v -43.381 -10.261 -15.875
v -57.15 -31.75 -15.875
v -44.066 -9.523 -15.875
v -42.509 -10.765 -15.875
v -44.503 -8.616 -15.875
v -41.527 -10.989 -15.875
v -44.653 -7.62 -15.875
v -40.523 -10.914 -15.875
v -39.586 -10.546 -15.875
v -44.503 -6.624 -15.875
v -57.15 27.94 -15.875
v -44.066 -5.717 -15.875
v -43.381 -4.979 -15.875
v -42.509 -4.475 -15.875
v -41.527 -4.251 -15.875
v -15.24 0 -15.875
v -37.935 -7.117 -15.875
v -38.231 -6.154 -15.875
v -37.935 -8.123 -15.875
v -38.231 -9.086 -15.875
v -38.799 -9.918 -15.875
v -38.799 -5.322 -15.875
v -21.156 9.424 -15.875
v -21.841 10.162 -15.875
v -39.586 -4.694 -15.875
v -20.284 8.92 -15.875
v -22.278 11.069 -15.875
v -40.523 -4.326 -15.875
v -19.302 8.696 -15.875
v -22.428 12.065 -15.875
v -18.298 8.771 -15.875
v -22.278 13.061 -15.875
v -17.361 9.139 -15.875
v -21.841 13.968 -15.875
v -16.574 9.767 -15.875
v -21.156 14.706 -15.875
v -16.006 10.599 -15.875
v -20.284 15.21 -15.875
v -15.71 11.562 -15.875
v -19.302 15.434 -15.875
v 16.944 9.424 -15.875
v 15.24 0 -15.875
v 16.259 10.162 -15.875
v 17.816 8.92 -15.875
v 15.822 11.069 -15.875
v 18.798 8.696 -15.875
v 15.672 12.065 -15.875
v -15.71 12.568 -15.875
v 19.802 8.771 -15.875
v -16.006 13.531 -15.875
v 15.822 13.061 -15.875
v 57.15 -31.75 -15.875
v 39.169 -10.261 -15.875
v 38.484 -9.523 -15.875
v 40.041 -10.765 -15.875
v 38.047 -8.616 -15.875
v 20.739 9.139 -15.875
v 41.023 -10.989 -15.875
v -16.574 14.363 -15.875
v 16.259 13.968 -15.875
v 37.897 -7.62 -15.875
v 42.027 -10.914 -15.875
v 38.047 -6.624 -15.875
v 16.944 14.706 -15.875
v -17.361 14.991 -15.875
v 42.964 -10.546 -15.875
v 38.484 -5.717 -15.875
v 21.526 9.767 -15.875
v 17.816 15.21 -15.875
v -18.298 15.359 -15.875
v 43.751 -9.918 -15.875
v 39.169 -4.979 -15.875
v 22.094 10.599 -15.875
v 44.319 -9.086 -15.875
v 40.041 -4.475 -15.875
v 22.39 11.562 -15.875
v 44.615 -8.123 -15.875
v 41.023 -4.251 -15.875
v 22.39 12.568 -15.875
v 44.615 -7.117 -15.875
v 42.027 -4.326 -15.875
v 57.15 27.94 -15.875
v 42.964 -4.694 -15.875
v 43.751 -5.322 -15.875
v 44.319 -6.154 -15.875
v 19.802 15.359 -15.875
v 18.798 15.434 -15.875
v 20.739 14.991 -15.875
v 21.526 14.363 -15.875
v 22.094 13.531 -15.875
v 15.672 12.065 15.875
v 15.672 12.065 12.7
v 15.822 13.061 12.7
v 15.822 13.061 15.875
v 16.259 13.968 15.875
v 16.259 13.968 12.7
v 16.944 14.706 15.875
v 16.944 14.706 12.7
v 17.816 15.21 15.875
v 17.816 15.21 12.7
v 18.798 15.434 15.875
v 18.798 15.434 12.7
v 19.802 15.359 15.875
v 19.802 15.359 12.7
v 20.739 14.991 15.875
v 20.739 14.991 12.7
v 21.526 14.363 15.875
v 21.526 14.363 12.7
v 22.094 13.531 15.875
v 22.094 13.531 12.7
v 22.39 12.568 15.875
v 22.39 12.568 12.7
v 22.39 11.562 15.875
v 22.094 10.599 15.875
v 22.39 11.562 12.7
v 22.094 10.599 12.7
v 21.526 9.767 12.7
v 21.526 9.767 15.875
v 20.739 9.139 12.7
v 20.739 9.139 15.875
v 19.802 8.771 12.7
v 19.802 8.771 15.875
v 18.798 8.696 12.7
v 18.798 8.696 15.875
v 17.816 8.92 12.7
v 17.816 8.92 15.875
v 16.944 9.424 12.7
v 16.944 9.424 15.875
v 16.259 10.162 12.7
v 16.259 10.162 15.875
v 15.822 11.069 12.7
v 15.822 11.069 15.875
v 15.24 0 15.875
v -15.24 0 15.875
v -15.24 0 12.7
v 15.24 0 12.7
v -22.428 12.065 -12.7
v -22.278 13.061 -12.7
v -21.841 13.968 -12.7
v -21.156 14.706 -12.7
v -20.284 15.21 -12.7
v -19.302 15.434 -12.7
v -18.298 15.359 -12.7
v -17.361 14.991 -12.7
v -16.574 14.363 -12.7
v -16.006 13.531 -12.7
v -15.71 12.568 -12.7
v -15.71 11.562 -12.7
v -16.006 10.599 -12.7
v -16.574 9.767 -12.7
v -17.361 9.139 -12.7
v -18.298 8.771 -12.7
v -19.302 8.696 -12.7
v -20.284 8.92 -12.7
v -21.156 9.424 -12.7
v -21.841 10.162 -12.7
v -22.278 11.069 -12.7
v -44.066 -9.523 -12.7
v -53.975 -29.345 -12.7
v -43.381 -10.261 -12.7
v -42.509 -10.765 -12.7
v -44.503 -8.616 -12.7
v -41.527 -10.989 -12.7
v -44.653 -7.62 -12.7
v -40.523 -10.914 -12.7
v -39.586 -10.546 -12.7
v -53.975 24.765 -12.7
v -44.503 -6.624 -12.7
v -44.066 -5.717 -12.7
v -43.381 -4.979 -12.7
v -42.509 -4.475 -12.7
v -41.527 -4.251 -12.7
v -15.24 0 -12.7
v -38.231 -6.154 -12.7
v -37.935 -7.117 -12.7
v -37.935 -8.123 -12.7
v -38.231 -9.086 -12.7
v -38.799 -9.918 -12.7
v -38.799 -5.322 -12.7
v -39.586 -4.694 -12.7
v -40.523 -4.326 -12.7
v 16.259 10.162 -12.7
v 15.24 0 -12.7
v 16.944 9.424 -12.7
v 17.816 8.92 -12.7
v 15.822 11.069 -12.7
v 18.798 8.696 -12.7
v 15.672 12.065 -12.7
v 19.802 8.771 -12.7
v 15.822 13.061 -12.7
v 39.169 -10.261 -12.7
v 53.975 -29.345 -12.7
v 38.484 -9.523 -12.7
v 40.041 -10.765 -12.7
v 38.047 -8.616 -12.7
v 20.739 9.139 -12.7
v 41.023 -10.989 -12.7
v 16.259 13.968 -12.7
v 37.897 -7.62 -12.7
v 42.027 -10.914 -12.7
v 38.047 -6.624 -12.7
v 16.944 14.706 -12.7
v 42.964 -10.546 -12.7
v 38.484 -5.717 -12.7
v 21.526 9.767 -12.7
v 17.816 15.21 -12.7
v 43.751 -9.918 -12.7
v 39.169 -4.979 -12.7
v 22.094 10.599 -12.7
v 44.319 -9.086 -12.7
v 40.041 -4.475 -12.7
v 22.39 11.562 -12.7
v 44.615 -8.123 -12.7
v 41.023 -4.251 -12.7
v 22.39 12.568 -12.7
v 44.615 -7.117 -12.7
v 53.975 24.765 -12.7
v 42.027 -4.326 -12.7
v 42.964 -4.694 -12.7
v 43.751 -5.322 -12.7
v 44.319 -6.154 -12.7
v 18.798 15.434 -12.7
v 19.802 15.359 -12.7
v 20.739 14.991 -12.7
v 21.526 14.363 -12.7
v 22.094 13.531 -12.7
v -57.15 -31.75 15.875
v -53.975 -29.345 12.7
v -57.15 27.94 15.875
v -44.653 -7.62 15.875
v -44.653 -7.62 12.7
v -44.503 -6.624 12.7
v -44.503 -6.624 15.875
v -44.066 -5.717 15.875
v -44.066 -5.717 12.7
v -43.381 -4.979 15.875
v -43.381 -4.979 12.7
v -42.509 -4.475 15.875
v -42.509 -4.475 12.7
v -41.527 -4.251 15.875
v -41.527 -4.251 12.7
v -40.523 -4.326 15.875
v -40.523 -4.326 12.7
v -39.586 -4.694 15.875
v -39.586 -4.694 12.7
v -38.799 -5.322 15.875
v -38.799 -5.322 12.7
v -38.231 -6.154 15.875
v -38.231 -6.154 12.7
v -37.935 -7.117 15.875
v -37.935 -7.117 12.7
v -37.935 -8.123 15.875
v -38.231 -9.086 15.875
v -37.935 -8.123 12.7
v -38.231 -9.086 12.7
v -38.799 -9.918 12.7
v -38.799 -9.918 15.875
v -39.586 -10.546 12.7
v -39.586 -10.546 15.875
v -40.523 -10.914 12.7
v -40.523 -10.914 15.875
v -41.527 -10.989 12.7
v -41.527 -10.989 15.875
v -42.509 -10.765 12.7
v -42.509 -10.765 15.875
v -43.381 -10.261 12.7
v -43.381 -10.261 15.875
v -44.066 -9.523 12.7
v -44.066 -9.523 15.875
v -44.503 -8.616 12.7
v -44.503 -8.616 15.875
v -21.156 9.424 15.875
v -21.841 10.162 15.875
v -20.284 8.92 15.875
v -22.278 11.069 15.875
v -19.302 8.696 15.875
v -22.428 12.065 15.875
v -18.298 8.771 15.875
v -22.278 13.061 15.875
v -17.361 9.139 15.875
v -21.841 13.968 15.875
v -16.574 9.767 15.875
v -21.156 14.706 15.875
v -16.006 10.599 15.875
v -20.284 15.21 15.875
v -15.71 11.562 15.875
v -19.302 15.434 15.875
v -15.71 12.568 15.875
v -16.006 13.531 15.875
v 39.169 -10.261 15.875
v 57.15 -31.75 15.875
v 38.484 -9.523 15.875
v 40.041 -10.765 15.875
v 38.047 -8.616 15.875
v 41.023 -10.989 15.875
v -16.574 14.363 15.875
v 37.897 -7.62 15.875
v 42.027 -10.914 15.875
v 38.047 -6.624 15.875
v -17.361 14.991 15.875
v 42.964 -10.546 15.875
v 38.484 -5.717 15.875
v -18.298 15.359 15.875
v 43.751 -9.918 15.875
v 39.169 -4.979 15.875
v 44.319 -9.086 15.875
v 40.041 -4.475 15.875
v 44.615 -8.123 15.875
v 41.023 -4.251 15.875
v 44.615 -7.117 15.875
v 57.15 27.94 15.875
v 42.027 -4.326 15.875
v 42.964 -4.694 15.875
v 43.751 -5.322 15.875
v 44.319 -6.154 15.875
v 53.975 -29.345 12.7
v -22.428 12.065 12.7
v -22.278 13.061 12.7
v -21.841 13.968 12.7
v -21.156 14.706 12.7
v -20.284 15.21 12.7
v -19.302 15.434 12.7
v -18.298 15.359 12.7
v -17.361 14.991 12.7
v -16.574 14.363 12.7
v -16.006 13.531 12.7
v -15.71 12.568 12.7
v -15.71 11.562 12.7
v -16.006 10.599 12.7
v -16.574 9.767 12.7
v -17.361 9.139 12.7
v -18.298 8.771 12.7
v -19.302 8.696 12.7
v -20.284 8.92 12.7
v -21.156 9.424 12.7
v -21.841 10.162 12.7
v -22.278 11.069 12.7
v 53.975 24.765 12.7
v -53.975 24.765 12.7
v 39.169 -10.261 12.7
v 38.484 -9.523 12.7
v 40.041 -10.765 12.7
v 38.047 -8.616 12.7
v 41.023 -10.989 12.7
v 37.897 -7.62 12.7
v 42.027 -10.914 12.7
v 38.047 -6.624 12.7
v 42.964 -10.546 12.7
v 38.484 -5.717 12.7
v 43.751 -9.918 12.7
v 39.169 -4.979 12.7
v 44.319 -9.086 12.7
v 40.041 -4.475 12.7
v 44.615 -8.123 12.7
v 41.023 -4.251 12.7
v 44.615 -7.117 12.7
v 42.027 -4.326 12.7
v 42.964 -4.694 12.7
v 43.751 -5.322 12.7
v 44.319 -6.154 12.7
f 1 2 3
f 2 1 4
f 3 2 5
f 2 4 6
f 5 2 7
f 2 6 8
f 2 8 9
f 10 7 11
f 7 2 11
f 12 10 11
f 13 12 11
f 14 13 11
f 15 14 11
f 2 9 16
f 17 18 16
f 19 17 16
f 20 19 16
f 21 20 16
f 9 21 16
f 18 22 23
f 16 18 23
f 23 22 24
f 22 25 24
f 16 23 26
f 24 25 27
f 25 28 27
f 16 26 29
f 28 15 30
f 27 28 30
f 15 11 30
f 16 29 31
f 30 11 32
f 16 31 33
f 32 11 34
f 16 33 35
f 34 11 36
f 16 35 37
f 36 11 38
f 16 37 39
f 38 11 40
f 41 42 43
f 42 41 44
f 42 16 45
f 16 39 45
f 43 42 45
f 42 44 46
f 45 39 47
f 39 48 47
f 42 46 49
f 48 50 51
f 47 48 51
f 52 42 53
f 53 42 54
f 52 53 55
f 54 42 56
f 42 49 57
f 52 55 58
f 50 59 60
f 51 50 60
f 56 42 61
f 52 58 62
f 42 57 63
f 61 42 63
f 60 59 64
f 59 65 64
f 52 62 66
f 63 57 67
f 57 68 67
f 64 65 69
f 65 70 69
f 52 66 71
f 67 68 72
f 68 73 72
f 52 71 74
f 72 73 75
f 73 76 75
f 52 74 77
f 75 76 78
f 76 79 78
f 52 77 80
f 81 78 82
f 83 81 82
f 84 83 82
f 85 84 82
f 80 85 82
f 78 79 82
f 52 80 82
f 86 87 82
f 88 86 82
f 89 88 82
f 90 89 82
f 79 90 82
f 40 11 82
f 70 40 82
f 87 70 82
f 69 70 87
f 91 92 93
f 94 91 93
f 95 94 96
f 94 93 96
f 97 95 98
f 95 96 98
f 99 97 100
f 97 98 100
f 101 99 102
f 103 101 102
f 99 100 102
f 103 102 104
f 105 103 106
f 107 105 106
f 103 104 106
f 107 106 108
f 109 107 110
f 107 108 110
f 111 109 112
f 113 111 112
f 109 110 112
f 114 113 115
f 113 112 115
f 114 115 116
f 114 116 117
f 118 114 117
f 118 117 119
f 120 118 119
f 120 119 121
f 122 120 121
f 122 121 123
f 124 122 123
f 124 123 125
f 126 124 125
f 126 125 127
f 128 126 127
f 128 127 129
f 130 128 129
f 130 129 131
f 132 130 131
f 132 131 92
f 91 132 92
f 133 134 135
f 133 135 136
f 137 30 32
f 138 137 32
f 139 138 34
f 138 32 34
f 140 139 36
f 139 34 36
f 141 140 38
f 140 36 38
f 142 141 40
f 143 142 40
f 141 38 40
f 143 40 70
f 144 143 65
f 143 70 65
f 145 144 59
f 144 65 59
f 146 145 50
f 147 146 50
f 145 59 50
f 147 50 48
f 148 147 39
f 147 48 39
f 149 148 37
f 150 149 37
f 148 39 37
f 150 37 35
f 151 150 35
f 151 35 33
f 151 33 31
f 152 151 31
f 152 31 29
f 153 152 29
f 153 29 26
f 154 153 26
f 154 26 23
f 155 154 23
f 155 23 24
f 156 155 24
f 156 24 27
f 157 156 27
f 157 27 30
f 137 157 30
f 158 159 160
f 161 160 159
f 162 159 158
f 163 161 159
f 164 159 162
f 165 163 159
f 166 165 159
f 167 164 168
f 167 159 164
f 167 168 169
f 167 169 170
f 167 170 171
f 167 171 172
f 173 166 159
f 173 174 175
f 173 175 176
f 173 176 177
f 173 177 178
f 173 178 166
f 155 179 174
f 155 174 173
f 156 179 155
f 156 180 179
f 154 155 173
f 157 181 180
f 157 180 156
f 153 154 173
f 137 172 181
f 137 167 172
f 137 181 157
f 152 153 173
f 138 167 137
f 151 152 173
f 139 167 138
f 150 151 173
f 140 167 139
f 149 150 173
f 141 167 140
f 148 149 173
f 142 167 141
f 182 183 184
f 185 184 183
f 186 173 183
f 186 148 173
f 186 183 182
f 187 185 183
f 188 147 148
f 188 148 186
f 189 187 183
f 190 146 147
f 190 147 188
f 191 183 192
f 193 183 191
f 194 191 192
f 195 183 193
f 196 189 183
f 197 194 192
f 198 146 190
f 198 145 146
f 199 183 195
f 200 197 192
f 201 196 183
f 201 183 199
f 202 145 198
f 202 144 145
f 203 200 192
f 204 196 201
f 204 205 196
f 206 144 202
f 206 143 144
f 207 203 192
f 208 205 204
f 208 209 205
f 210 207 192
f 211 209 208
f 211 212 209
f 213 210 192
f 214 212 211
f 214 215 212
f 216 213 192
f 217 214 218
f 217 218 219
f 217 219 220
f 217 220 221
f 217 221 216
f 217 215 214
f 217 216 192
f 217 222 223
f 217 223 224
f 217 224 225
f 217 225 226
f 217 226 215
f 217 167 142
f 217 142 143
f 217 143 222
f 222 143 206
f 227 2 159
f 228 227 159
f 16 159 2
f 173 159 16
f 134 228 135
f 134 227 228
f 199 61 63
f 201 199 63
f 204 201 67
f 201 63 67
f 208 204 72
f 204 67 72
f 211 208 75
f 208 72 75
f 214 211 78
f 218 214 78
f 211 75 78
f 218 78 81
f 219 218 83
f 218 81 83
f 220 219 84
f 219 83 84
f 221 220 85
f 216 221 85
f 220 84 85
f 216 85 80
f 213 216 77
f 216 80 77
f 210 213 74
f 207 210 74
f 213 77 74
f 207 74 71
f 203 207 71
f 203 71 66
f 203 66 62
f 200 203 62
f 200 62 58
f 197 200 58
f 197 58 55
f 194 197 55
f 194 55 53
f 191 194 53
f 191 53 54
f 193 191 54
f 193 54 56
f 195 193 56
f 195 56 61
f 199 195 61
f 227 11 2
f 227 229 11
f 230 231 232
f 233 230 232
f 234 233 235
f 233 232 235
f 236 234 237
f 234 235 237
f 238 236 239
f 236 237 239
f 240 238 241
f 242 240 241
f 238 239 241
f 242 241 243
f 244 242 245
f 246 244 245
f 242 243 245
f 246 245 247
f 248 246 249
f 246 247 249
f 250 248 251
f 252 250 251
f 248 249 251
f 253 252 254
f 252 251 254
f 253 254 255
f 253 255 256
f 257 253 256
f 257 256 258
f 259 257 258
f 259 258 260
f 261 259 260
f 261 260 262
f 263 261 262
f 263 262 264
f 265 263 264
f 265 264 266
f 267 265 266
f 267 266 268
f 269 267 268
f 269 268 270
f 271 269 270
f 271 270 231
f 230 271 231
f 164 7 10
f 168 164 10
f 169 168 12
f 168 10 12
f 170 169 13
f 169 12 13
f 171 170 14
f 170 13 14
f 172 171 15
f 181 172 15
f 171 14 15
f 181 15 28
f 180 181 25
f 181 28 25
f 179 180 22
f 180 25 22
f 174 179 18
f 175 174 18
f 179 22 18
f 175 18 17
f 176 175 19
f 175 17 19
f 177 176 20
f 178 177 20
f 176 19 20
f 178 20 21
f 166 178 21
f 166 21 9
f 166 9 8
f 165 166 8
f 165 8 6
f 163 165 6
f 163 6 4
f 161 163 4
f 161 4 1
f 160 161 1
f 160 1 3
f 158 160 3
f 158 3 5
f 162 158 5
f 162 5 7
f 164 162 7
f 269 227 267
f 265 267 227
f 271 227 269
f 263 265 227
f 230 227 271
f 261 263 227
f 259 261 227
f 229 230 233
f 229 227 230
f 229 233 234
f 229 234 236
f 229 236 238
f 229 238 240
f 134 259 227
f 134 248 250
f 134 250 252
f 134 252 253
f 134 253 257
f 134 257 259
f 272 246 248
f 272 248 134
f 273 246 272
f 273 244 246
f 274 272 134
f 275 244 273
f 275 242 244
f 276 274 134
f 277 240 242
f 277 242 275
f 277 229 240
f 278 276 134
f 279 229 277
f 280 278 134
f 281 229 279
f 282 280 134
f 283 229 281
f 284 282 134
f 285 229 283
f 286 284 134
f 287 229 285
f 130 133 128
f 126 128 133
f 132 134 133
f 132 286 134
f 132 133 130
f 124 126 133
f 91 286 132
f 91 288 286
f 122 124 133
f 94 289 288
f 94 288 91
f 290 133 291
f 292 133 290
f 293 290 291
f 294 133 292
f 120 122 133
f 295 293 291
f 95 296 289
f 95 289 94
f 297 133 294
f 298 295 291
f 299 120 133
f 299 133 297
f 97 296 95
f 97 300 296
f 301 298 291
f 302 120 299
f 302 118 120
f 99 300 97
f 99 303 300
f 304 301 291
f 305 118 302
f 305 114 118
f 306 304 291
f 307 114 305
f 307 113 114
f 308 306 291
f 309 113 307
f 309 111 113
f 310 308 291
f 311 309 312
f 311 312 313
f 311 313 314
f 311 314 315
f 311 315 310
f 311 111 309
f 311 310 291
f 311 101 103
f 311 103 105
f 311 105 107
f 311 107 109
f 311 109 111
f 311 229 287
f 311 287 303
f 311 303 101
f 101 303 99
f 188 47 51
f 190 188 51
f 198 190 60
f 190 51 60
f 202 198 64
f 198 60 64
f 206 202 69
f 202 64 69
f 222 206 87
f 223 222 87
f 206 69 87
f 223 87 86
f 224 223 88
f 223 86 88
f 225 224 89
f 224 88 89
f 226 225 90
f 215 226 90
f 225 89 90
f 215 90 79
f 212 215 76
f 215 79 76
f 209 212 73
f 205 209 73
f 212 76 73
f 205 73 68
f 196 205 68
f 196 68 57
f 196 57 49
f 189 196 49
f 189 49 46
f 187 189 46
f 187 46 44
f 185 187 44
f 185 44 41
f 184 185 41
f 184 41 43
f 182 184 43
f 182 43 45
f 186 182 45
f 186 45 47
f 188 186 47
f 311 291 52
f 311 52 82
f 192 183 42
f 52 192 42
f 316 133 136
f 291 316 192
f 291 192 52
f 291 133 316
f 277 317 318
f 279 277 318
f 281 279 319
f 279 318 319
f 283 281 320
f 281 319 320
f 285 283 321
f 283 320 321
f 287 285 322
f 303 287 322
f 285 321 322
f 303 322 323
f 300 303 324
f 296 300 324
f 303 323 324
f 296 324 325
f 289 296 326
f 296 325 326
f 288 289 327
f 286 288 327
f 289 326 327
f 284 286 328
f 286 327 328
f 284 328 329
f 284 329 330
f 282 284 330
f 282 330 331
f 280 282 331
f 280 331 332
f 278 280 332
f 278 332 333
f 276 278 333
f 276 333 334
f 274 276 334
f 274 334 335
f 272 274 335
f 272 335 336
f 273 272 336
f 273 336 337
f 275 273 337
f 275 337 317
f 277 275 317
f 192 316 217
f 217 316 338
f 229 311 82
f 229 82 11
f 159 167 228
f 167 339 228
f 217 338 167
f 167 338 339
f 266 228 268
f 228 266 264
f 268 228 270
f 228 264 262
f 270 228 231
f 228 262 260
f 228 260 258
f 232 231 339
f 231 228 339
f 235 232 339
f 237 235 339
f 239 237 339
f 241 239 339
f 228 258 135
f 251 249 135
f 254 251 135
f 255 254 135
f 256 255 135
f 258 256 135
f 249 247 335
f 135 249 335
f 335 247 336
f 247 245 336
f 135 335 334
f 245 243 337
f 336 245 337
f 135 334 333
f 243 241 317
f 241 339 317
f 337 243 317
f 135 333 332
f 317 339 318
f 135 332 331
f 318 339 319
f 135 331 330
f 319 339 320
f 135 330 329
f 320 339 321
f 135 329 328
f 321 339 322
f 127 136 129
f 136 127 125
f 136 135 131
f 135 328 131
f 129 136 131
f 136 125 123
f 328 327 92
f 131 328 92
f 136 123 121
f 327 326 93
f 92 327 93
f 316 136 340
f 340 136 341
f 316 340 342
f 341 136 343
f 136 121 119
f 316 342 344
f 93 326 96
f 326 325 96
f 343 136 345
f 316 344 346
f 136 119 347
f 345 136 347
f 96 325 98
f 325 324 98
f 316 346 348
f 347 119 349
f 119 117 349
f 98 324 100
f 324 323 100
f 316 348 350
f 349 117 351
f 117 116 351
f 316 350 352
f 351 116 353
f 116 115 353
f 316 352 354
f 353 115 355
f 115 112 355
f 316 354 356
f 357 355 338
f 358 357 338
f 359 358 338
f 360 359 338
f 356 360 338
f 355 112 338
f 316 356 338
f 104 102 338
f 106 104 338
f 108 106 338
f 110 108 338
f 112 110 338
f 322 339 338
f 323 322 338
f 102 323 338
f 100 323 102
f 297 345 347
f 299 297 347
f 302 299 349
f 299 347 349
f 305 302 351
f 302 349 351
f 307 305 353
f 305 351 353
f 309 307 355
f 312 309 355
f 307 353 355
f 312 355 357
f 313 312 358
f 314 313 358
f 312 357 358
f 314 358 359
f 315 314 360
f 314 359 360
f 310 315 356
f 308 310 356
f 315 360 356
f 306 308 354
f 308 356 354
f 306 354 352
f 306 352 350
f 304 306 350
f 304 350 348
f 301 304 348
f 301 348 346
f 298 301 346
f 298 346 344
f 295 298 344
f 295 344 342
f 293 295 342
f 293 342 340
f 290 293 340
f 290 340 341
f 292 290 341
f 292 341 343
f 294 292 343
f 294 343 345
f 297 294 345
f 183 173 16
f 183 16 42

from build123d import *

# Parameters (mm, degrees)
BOSS_EXTRUDE2_DEPTH = 15.875
SHELL2_T            = -3.175
SKETCH3_R           = 3.3782
CUT_EXTRUDE1_DEPTH  = 32.75


with BuildPart() as part:
    # Sketch2 → Boss-Extrude2 (new body, symmetric)
    with BuildSketch(Plane.XY):
        Polygon((-15.24, 0), (15.24, 0), (57.15, -31.75), (57.15, 27.94), (-57.15, 27.94), (-57.15, -31.75), align=None)
    extrude(amount=BOSS_EXTRUDE2_DEPTH, both=True)

    # Shell2
    shell2_openings = [part.faces().sort_by_distance(p)[0] for p in [
        (36.195, -15.875, 0),
        (0, 0, 0),
        (-36.195, -15.875, 0),
    ]]
    offset(amount=SHELL2_T, openings=shell2_openings, kind=Kind.INTERSECTION)

    # Sketch3 → Cut-Extrude1 (cut, through all)
    with BuildSketch(Plane(origin=(0, 0, -15.875), x_dir=(-1, 0, 0), z_dir=(0, 0, -1))):
        with Locations((41.275, -7.62)):
            Circle(SKETCH3_R)
        with Locations((19.05, 12.065)):
            Circle(SKETCH3_R)
        with Locations((-19.05, 12.065)):
            Circle(SKETCH3_R)
        with Locations((-41.275, -7.62)):
            Circle(SKETCH3_R)
    extrude(amount=-CUT_EXTRUDE1_DEPTH, mode=Mode.SUBTRACT)


solid = part.part
